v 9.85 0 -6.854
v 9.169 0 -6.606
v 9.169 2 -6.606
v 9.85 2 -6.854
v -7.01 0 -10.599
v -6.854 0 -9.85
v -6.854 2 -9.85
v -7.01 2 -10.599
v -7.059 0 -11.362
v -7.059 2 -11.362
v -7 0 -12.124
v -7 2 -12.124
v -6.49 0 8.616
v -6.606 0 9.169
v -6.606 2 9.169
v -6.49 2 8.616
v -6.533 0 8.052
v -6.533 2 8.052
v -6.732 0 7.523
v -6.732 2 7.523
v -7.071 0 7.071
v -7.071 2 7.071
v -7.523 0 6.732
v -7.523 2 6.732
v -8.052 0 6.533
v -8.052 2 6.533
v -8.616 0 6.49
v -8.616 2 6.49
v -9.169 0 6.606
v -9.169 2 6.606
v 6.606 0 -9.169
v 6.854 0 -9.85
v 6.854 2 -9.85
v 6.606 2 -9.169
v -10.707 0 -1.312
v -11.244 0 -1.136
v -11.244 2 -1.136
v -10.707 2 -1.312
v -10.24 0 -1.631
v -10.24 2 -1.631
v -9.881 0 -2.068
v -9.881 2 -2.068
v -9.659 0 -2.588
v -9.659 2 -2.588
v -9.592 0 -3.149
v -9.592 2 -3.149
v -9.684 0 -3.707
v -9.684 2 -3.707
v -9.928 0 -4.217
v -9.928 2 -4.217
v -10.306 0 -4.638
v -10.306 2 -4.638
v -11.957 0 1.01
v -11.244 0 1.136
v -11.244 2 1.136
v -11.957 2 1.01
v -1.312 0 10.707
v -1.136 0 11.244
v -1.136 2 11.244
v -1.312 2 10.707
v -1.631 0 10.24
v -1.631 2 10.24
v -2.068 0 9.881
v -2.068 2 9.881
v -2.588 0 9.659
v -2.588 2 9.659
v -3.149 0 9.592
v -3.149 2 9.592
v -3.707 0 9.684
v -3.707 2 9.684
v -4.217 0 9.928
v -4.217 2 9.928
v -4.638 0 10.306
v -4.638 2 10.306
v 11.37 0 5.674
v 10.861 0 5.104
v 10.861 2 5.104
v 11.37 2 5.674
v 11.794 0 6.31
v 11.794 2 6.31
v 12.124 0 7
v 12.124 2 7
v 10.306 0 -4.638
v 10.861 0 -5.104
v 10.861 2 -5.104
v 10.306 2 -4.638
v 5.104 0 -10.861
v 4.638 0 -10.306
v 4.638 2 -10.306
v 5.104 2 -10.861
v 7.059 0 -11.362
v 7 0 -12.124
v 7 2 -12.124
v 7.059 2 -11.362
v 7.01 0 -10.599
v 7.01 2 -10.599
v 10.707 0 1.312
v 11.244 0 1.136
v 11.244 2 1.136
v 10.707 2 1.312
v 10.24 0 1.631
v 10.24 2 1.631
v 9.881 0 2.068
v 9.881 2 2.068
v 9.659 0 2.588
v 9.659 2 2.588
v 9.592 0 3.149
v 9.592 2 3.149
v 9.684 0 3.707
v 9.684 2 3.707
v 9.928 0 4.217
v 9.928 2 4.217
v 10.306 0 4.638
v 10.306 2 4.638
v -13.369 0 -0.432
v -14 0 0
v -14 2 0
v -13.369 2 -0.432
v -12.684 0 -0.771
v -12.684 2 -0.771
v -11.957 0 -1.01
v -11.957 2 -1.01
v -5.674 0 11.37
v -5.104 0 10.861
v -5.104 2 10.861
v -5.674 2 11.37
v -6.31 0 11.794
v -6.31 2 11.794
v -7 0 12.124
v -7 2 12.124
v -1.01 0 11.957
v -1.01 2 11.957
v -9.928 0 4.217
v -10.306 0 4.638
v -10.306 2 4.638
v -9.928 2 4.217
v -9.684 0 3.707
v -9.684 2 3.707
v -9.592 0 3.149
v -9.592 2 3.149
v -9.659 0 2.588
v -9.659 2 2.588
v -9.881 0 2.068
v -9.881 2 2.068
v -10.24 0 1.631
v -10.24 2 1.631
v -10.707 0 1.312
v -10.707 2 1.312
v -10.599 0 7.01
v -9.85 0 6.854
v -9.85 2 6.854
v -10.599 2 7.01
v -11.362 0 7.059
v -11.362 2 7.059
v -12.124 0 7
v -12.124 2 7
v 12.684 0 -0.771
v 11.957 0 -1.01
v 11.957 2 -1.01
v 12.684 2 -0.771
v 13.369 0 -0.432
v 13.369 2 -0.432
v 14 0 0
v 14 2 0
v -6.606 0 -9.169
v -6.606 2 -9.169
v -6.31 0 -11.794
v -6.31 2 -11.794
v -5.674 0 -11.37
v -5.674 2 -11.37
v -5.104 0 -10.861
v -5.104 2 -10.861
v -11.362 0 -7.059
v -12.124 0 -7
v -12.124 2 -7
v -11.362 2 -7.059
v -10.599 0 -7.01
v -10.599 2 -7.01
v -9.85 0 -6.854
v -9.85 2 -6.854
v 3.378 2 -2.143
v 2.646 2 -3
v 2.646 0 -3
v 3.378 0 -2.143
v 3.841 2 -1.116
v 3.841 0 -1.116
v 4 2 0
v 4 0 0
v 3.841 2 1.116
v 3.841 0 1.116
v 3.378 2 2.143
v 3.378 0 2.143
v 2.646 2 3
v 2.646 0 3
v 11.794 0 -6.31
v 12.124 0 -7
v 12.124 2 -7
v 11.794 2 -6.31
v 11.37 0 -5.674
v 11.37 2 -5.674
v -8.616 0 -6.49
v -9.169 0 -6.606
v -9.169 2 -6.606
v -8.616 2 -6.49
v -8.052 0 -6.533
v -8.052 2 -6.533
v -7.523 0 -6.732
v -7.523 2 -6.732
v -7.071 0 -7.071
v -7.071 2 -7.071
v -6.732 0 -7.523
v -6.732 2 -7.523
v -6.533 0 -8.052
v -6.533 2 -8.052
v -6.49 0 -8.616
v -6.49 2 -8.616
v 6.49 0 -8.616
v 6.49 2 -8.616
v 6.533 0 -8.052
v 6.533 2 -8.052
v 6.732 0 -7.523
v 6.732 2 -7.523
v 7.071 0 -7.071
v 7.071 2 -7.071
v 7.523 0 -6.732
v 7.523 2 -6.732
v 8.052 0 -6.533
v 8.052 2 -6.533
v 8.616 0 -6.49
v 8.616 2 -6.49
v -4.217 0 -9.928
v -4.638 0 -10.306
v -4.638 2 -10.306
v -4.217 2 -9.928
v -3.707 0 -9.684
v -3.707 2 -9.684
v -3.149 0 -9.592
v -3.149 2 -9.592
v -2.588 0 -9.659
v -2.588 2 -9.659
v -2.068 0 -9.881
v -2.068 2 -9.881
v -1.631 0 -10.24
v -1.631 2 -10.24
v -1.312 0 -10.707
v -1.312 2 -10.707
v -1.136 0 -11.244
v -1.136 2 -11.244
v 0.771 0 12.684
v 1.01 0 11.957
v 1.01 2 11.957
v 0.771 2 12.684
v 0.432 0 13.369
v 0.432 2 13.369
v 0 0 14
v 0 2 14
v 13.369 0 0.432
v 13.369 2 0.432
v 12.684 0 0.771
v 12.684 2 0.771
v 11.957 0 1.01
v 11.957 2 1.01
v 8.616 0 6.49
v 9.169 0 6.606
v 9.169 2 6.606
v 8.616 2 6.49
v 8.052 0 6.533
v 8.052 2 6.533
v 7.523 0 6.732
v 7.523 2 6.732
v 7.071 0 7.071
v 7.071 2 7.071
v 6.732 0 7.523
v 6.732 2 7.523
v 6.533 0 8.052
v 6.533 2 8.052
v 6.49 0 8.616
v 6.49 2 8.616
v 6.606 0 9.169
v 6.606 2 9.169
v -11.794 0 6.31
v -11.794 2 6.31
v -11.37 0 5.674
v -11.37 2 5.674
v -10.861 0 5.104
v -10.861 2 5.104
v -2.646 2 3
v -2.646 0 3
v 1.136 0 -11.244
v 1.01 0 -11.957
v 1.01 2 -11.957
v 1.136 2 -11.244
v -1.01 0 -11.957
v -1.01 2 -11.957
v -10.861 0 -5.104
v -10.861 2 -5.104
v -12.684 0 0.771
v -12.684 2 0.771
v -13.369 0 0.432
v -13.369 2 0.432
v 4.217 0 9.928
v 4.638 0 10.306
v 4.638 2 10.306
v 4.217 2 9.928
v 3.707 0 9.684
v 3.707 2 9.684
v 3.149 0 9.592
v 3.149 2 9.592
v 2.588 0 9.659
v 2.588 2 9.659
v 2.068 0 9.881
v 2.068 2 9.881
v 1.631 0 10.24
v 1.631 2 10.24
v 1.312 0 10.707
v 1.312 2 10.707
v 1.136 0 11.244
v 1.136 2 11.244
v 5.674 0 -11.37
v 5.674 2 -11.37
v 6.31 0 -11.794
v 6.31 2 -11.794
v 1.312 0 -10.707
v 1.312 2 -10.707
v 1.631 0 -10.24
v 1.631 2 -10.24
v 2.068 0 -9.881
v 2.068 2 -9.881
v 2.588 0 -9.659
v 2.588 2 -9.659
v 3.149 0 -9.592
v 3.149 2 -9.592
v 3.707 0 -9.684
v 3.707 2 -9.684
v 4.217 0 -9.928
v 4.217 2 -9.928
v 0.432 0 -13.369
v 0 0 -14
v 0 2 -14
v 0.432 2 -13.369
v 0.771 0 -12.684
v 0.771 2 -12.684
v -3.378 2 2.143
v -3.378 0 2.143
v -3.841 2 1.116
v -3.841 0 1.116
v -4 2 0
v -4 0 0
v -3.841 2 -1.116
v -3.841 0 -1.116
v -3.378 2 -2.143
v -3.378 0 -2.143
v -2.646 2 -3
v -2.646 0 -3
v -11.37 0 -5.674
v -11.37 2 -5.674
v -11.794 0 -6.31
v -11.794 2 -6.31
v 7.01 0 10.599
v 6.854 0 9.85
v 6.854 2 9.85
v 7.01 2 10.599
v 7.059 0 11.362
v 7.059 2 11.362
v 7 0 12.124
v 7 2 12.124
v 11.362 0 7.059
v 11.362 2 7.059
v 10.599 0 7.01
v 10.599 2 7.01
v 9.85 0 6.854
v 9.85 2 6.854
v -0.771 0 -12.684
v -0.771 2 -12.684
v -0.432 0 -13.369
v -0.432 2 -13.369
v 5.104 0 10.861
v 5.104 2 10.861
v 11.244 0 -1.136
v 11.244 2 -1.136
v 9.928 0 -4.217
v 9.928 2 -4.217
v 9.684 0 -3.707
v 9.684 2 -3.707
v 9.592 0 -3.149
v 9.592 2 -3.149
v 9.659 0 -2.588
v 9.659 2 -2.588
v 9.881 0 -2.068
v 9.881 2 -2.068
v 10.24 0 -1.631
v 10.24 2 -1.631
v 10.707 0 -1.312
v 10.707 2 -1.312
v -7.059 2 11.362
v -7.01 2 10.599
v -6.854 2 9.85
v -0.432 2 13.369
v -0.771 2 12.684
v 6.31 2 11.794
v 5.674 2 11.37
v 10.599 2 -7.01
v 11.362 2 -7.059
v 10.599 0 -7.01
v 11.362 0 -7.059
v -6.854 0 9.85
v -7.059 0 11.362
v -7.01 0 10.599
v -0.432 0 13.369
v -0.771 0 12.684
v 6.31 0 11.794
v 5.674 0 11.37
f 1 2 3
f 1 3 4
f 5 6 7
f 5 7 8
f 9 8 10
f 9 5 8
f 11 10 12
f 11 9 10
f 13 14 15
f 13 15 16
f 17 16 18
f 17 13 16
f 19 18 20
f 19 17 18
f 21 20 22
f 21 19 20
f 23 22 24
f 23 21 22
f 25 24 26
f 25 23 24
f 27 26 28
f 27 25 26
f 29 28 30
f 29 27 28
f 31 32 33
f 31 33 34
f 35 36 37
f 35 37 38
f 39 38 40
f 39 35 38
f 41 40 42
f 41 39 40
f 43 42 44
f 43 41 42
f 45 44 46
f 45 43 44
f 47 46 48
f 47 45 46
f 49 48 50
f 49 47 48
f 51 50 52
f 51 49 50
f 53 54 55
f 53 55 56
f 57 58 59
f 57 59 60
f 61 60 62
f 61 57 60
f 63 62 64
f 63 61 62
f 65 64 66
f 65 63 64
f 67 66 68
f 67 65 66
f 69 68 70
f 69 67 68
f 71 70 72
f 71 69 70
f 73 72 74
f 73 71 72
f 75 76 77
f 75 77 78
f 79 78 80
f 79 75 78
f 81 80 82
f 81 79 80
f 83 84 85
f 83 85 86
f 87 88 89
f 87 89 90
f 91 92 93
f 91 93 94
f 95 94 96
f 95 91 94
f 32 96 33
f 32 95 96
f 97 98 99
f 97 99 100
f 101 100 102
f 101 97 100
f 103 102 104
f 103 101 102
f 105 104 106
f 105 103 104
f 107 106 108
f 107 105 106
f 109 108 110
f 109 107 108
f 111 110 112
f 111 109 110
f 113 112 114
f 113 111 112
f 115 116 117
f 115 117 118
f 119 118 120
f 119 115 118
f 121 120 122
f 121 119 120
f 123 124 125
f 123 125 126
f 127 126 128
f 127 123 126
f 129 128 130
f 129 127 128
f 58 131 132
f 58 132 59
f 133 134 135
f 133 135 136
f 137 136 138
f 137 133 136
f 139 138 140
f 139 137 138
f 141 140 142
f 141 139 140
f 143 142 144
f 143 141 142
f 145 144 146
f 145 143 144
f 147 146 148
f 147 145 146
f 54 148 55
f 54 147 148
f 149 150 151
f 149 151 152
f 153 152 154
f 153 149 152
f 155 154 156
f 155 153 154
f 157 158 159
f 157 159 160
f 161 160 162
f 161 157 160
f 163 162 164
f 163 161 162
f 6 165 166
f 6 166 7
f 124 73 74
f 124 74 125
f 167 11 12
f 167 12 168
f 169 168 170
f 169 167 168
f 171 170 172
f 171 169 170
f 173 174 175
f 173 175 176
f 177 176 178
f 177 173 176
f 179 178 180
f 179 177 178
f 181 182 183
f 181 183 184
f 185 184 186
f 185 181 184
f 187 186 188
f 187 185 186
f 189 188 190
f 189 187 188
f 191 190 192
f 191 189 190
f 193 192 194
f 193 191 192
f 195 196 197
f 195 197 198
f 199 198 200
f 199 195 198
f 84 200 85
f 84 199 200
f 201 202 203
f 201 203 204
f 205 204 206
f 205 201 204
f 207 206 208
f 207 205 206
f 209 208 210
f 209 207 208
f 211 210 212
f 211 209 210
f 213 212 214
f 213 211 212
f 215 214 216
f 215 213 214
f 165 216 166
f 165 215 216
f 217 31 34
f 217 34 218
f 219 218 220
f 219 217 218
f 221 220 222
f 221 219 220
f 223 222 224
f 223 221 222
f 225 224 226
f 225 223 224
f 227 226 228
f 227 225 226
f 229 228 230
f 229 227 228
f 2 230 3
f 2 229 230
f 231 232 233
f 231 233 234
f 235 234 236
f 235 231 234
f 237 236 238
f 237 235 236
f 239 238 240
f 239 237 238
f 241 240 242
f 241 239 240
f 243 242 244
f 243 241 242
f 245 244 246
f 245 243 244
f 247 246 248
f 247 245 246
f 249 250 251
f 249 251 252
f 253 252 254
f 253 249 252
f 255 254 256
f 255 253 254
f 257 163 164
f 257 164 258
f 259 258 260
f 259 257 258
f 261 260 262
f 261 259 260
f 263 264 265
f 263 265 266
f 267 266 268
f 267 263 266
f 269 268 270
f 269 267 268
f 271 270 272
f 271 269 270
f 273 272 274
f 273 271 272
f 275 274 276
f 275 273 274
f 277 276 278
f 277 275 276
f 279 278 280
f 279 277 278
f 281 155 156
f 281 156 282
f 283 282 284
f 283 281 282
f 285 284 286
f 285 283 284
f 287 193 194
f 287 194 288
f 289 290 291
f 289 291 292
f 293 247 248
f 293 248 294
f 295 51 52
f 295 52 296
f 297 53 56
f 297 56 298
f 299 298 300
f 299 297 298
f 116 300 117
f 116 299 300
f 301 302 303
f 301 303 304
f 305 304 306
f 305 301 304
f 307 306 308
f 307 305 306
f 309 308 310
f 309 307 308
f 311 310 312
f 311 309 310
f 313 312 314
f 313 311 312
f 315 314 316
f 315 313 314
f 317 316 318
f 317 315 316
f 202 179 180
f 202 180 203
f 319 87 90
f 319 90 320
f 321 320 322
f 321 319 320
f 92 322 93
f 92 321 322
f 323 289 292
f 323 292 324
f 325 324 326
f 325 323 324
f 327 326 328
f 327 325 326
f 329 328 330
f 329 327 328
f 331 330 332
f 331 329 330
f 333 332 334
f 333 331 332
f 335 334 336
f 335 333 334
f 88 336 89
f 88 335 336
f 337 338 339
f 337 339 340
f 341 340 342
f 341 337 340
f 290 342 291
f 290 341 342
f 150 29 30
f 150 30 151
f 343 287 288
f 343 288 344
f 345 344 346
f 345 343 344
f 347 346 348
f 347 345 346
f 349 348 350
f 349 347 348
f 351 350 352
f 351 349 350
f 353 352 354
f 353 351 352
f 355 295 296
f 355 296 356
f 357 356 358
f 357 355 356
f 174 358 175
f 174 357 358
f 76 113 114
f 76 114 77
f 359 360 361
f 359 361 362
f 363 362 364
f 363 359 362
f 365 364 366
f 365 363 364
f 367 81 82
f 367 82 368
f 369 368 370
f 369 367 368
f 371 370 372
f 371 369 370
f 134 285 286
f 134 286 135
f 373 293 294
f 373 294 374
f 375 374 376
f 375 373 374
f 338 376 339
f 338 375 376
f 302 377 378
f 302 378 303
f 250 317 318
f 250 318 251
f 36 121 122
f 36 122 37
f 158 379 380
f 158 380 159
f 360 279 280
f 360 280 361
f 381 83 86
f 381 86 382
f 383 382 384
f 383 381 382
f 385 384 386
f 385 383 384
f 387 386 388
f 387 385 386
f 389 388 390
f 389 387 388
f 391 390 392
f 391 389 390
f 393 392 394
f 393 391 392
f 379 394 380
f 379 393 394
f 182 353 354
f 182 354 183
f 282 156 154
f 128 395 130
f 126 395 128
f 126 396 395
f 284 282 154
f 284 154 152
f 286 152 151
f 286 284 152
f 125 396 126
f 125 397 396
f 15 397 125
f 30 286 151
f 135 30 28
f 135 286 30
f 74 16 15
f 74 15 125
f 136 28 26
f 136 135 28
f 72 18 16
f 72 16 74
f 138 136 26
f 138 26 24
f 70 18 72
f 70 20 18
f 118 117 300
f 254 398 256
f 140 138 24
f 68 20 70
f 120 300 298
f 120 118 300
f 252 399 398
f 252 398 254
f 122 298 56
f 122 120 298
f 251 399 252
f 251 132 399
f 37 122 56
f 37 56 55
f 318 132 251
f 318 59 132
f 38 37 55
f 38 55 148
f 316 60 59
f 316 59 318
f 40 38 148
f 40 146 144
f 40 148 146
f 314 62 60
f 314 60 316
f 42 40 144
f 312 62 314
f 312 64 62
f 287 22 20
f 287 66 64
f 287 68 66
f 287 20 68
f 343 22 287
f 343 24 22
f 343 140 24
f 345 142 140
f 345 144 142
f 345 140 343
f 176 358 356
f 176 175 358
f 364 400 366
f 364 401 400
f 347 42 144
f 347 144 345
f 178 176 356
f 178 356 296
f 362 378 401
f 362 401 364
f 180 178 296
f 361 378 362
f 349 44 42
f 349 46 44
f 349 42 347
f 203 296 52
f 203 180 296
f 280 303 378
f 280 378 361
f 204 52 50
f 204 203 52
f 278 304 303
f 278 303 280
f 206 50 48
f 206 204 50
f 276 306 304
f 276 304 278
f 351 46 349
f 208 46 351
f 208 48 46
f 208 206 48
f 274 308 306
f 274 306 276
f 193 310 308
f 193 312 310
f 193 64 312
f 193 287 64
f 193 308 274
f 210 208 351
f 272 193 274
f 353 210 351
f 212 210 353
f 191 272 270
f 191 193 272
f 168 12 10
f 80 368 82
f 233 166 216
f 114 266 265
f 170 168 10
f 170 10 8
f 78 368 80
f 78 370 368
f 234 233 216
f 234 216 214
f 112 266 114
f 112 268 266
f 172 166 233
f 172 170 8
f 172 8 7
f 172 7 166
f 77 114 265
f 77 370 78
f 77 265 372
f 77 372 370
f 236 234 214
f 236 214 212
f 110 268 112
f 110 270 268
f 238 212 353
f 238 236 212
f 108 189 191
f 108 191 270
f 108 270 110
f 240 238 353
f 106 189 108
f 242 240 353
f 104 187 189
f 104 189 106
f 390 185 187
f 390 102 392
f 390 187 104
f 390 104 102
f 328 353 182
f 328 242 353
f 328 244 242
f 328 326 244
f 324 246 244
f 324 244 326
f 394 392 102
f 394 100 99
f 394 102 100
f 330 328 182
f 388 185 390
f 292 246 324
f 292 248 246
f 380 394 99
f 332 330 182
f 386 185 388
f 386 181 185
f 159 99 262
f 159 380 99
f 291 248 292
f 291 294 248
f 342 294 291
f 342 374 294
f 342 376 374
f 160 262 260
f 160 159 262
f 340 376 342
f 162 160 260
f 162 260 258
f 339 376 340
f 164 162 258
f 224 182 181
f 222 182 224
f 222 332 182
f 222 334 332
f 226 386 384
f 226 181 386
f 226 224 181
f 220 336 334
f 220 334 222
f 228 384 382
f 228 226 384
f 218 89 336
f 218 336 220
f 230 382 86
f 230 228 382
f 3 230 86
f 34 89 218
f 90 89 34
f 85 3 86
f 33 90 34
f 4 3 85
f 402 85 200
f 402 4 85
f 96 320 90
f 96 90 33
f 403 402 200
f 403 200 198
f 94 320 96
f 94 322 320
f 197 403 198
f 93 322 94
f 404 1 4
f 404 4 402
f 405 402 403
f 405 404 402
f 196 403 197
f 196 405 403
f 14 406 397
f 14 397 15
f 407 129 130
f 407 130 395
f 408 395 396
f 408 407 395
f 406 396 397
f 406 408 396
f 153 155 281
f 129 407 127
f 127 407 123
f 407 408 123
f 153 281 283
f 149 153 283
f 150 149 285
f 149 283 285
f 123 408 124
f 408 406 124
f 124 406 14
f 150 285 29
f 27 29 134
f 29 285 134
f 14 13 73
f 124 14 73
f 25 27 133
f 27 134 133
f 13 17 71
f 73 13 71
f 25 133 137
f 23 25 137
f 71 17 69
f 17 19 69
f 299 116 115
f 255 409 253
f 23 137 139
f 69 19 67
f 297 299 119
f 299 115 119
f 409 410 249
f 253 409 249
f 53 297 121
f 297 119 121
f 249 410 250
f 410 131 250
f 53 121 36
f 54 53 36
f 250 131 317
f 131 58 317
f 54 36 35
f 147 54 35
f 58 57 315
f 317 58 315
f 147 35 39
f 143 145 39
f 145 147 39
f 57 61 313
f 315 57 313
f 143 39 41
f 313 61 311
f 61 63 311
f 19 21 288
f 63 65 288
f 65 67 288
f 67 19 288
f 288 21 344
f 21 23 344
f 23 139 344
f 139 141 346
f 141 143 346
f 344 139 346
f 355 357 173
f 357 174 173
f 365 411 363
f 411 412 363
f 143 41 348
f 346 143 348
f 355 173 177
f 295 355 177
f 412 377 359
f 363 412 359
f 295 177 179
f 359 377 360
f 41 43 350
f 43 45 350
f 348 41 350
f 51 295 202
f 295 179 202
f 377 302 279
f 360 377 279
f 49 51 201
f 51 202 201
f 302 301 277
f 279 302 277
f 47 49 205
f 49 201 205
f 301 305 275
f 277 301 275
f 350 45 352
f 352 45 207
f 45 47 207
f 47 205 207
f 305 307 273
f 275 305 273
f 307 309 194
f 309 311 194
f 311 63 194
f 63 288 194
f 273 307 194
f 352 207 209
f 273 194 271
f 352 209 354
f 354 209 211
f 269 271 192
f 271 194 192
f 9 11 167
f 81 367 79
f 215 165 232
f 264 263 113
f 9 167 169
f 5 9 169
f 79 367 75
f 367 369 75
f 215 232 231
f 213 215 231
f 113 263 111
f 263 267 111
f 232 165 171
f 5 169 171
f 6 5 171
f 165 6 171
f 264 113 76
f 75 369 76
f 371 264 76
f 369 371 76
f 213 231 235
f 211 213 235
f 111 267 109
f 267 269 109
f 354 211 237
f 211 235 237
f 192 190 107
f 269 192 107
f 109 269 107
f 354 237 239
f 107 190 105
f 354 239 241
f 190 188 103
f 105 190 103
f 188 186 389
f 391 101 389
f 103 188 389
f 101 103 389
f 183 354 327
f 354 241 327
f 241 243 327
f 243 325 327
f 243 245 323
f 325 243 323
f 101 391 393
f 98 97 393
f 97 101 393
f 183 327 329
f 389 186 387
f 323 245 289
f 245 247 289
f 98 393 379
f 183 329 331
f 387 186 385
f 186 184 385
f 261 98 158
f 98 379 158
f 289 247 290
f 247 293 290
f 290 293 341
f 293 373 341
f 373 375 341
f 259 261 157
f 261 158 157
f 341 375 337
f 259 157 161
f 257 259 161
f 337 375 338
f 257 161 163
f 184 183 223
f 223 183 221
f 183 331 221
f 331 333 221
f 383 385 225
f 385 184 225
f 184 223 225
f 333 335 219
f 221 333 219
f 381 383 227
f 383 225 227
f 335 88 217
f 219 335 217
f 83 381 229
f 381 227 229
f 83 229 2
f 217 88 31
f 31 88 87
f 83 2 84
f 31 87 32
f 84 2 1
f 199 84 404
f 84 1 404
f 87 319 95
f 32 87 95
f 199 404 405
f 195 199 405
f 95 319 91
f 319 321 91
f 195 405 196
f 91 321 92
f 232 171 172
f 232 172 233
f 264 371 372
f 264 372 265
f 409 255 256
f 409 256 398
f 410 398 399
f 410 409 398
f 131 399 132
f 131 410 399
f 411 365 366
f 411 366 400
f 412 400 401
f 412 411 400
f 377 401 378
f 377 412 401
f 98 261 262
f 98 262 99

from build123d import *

# Parameters (mm, degrees)
SKETCH1_R           = 10
BOSS_EXTRUDE3_DEPTH = 2
CUT_EXTRUDE4_START  = -2
CUT_EXTRUDE4_DEPTH  = 2
CUT_EXTRUDE5_DEPTH  = 2
CUT_EXTRUDE7_START  = -2
CUT_EXTRUDE7_DEPTH  = 2


with BuildPart() as part:
    # Sketch1 → Boss-Extrude3 (new body)
    # profile 1 of 3: a face of its own
    with BuildSketch(Plane(origin=(0, 0, 0), x_dir=(1, 0, 0), z_dir=(0, 1, 0))):
        with BuildLine():
            ThreePointArc((-2.576546391, 9.66237076), (-3.696714803, 9.688501423), (-4.6270391, 10.312966622))
            Line((-4.6270391, 10.312966622), (-5.089759275, 10.867122458))
            add(Edge.make_bspline(
                [(-5.089759275, 10.867122458), (-6.64901802, 12.325915574), (-6.970753087, 12.141194398)],
                knots=[0, 0, 0, 1, 1, 1], degree=2, weights=[1, 1.687053572, 1]))
            ThreePointArc((-6.970753087, 12.141194398), (-7.014608214, -12.115909855), (14, 0))
            ThreePointArc((14, 0), (9.899494937, 9.899494937), (0, 14))
            add(Edge.make_bspline(
                [(-0.996876474, 11.958521535), (-0.370992408, 14), (0, 14)],
                knots=[0, 0, 0, 1, 1, 1], degree=2, weights=[1, 1.687053572, 1]))
            Line((-0.996876474, 11.958521535), (-1.122240194, 11.247548548))
            ThreePointArc((-1.122240194, 11.247548548), (-1.618115564, 10.242776114), (-2.576546391, 9.66237076))
        make_face()
        with BuildLine():
            ThreePointArc((10, 0), (-6.092394278, -7.9298633), (-2.576546391, 9.66237076))
            ThreePointArc((-2.576546391, 9.66237076), (6.092394278, 7.9298633), (10, 0))
        make_face(mode=Mode.SUBTRACT)
    # profile 2 of 3: a face of its own
    with BuildSketch(Plane(origin=(0, 0, 0), x_dir=(1, 0, 0), z_dir=(0, 1, 0))):
        Circle(SKETCH1_R)
    # profile 3 of 3: a face of its own
    with BuildSketch(Plane(origin=(0, 0, 0), x_dir=(1, 0, 0), z_dir=(0, 1, 0))):
        with BuildLine():
            Line((-5.089759275, 10.867122458), (-4.6270391, 10.312966622))
            ThreePointArc((-4.6270391, 10.312966622), (-3.696714803, 9.688501423), (-2.576546391, 9.66237076))
            ThreePointArc((-2.576546391, 9.66237076), (-1.618115564, 10.242776114), (-1.122240194, 11.247548548))
            Line((-1.122240194, 11.247548548), (-0.996876474, 11.958521535))
            add(Edge.make_bspline(
                [(-0.996876474, 11.958521535), (-0.370992408, 14), (0, 14)],
                knots=[0, 0, 0, 1, 1, 1], degree=2, weights=[1, 1.687053572, 1]))
            ThreePointArc((0, 14), (-3.607164983, 13.527319054), (-6.970753087, 12.141194398))
            add(Edge.make_bspline(
                [(-5.089759275, 10.867122458), (-6.64901802, 12.325915574), (-6.970753087, 12.141194398)],
                knots=[0, 0, 0, 1, 1, 1], degree=2, weights=[1, 1.687053572, 1]))
        make_face()
    extrude(amount=BOSS_EXTRUDE3_DEPTH)

    # Sketch2 → Cut-Extrude4 (cut)
    with BuildSketch(Plane(origin=(0, 2, 0), x_dir=(1, 0, 0), z_dir=(0, 1, 0)).offset(CUT_EXTRUDE4_START)):
        with BuildLine():
            Line((-1.136213035, 11.24381356), (-1.010390736, 11.95738728))
            ThreePointArc((-1.010390736, 11.95738728), (-0.613638742, 13.032335811), (0, 14))
            ThreePointArc((0, 14), (-3.623466631, 13.522961568), (-7, 12.124355653))
            ThreePointArc((-7, 12.124355653), (-5.984741166, 11.593153253), (-5.103669595, 10.860596515))
            Line((-5.103669595, 10.860596515), (-4.637917427, 10.305534696))
            ThreePointArc((-4.637917427, 10.305534696), (-2.588190451, 9.659258263), (-1.136213035, 11.24381356))
        make_face()
    extrude(amount=CUT_EXTRUDE4_DEPTH, mode=Mode.SUBTRACT)

    # Sketch3 → Cut-Extrude5 (cut)
    with BuildSketch(Plane(origin=(0, 2, 0), x_dir=(1, 0, 0), z_dir=(0, 1, 0))):
        with BuildLine():
            Line((-2.645751311, 3), (2.645751311, 3))
            ThreePointArc((2.645751311, 3), (4, 0), (2.645751311, -3))
            Line((2.645751311, -3), (-2.645751311, -3))
            ThreePointArc((-2.645751311, -3), (-4, 0), (-2.645751311, 3))
        make_face()
    extrude(amount=-CUT_EXTRUDE5_DEPTH, mode=Mode.SUBTRACT)

    # Sketch2<5> → Cut-Extrude7 (cut)
    with BuildSketch(Plane(origin=(0, 2, 0), x_dir=(1, 0, 0), z_dir=(0, 1, 0)).offset(CUT_EXTRUDE7_START)):
        with BuildLine():
            ThreePointArc((7, 12.124355653), (3.623466631, 13.522961568), (0, 14))
            ThreePointArc((0, 14), (0.613638742, 13.032335811), (1.010390736, 11.95738728))
            Line((1.010390736, 11.95738728), (1.136213035, 11.24381356))
            ThreePointArc((1.136213035, 11.24381356), (2.588190451, 9.659258263), (4.637917427, 10.305534696))
            Line((4.637917427, 10.305534696), (5.103669595, 10.860596515))
            ThreePointArc((5.103669595, 10.860596515), (5.984741166, 11.593153253), (7, 12.124355653))
        make_face()
        with BuildLine():
            ThreePointArc((12.124355653, 7), (9.899494937, 9.899494937), (7, 12.124355653))
            ThreePointArc((7, 12.124355653), (7.047594644, 10.979514512), (6.853717685, 9.850205779))
            Line((6.853717685, 9.850205779), (6.605896133, 9.169321661))
            ThreePointArc((6.605896133, 9.169321661), (7.071067812, 7.071067812), (9.169321661, 6.605896133))
            Line((9.169321661, 6.605896133), (9.850205779, 6.853717685))
            ThreePointArc((9.850205779, 6.853717685), (10.979514512, 7.047594644), (12.124355653, 7))
        make_face()
        with BuildLine():
            ThreePointArc((14, 0), (13.522961568, 3.623466631), (12.124355653, 7))
            ThreePointArc((12.124355653, 7), (11.593153253, 5.984741166), (10.860596515, 5.103669595))
            Line((10.860596515, 5.103669595), (10.305534696, 4.637917427))
            ThreePointArc((10.305534696, 4.637917427), (9.659258263, 2.588190451), (11.24381356, 1.136213035))
            Line((11.24381356, 1.136213035), (11.95738728, 1.010390736))
            ThreePointArc((11.95738728, 1.010390736), (13.032335811, 0.613638742), (14, 0))
        make_face()
        with BuildLine():
            ThreePointArc((-6.853717685, 9.850205779), (-7.047594644, 10.979514512), (-7, 12.124355653))
            ThreePointArc((-7, 12.124355653), (-9.899494937, 9.899494937), (-12.124355653, 7))
            ThreePointArc((-12.124355653, 7), (-10.979514512, 7.047594644), (-9.850205779, 6.853717685))
            Line((-9.850205779, 6.853717685), (-9.169321661, 6.605896133))
            ThreePointArc((-9.169321661, 6.605896133), (-7.071067812, 7.071067812), (-6.605896133, 9.169321661))
            Line((-6.605896133, 9.169321661), (-6.853717685, 9.850205779))
        make_face()
        with BuildLine():
            ThreePointArc((12.124355653, -7), (13.522961568, -3.623466631), (14, 0))
            ThreePointArc((14, 0), (13.032335811, -0.613638742), (11.95738728, -1.010390736))
            Line((11.95738728, -1.010390736), (11.24381356, -1.136213035))
            ThreePointArc((11.24381356, -1.136213035), (9.659258263, -2.588190451), (10.305534696, -4.637917427))
            Line((10.305534696, -4.637917427), (10.860596515, -5.103669595))
            ThreePointArc((10.860596515, -5.103669595), (11.593153253, -5.984741166), (12.124355653, -7))
        make_face()
        with BuildLine():
            ThreePointArc((-10.860596515, 5.103669595), (-11.593153253, 5.984741166), (-12.124355653, 7))
            ThreePointArc((-12.124355653, 7), (-13.522961568, 3.623466631), (-14, 0))
            ThreePointArc((-14, 0), (-13.032335811, 0.613638742), (-11.95738728, 1.010390736))
            Line((-11.95738728, 1.010390736), (-11.24381356, 1.136213035))
            ThreePointArc((-11.24381356, 1.136213035), (-9.659258263, 2.588190451), (-10.305534696, 4.637917427))
            Line((-10.305534696, 4.637917427), (-10.860596515, 5.103669595))
        make_face()
        with BuildLine():
            ThreePointArc((7, -12.124355653), (9.899494937, -9.899494937), (12.124355653, -7))
            ThreePointArc((12.124355653, -7), (10.979514512, -7.047594644), (9.850205779, -6.853717685))
            Line((9.850205779, -6.853717685), (9.169321661, -6.605896133))
            ThreePointArc((9.169321661, -6.605896133), (7.071067812, -7.071067812), (6.605896133, -9.169321661))
            Line((6.605896133, -9.169321661), (6.853717685, -9.850205779))
            ThreePointArc((6.853717685, -9.850205779), (7.047594644, -10.979514512), (7, -12.124355653))
        make_face()
        with BuildLine():
            ThreePointArc((-11.95738728, -1.010390736), (-13.032335811, -0.613638742), (-14, 0))
            ThreePointArc((-14, 0), (-13.522961568, -3.623466631), (-12.124355653, -7))
            ThreePointArc((-12.124355653, -7), (-11.593153253, -5.984741166), (-10.860596515, -5.103669595))
            Line((-10.860596515, -5.103669595), (-10.305534696, -4.637917427))
            ThreePointArc((-10.305534696, -4.637917427), (-9.659258263, -2.588190451), (-11.24381356, -1.136213035))
            Line((-11.24381356, -1.136213035), (-11.95738728, -1.010390736))
        make_face()
        with BuildLine():
            ThreePointArc((0, -14), (3.623466631, -13.522961568), (7, -12.124355653))
            ThreePointArc((7, -12.124355653), (5.984741166, -11.593153253), (5.103669595, -10.860596515))
            Line((5.103669595, -10.860596515), (4.637917427, -10.305534696))
            ThreePointArc((4.637917427, -10.305534696), (2.588190451, -9.659258263), (1.136213035, -11.24381356))
            Line((1.136213035, -11.24381356), (1.010390736, -11.95738728))
            ThreePointArc((1.010390736, -11.95738728), (0.613638742, -13.032335811), (0, -14))
        make_face()
        with BuildLine():
            ThreePointArc((-9.850205779, -6.853717685), (-10.979514512, -7.047594644), (-12.124355653, -7))
            ThreePointArc((-12.124355653, -7), (-9.899494937, -9.899494937), (-7, -12.124355653))
            ThreePointArc((-7, -12.124355653), (-7.047594644, -10.979514512), (-6.853717685, -9.850205779))
            Line((-6.853717685, -9.850205779), (-6.605896133, -9.169321661))
            ThreePointArc((-6.605896133, -9.169321661), (-7.071067812, -7.071067812), (-9.169321661, -6.605896133))
            Line((-9.169321661, -6.605896133), (-9.850205779, -6.853717685))
        make_face()
        with BuildLine():
            ThreePointArc((-7, -12.124355653), (-3.623466631, -13.522961568), (0, -14))
            ThreePointArc((0, -14), (-0.613638742, -13.032335811), (-1.010390736, -11.95738728))
            Line((-1.010390736, -11.95738728), (-1.136213035, -11.24381356))
            ThreePointArc((-1.136213035, -11.24381356), (-2.588190451, -9.659258263), (-4.637917427, -10.305534696))
            Line((-4.637917427, -10.305534696), (-5.103669595, -10.860596515))
            ThreePointArc((-5.103669595, -10.860596515), (-5.984741166, -11.593153253), (-7, -12.124355653))
        make_face()
    extrude(amount=CUT_EXTRUDE7_DEPTH, mode=Mode.SUBTRACT)


solid = part.part
